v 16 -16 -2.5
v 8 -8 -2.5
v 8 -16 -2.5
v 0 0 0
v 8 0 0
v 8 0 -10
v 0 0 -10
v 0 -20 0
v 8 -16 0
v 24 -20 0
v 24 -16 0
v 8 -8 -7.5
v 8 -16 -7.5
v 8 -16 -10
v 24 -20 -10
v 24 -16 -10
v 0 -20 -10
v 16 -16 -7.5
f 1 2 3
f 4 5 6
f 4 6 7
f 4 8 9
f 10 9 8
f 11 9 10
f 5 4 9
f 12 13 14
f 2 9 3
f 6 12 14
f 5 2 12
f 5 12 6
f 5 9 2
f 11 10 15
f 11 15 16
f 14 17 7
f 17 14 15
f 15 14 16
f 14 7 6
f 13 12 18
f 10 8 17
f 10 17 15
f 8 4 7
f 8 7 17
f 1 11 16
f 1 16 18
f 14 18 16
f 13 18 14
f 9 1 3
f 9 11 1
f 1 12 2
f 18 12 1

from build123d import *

# Parameters (mm, degrees)
EXTRUDE_1_DEPTH  = 10
RIB_29_REACH     = 33.639
SKETCH_20_WALL_W = 76.590876578
SKETCH_20_WALL_H = 5


with BuildPart() as part:
    # 草图4 → 凸台-拉伸1 (new body)
    with BuildSketch(Plane.XY):
        Polygon((0, 0), (0, -20), (24, -20), (24, -16), (8, -16), (8, 0), align=None)
    extrude(amount=-EXTRUDE_1_DEPTH)

    # 草图20 wall → 筋29 (add, up to next)
    with BuildSketch(Plane(origin=(12, -12, -5), x_dir=(0.707106781187, -0.707106781187, 0), z_dir=(0.707106781187, 0.707106781187, 0)), mode=Mode.PRIVATE) as rib_29_sk1:
        Rectangle(SKETCH_20_WALL_W, SKETCH_20_WALL_H)
    rib_29_tool1 = extrude(rib_29_sk1.sketch, amount=-RIB_29_REACH, mode=Mode.PRIVATE) - part.part
    add(rib_29_tool1.solids().sort_by_distance((12, -12, -5))[0])


solid = part.part
